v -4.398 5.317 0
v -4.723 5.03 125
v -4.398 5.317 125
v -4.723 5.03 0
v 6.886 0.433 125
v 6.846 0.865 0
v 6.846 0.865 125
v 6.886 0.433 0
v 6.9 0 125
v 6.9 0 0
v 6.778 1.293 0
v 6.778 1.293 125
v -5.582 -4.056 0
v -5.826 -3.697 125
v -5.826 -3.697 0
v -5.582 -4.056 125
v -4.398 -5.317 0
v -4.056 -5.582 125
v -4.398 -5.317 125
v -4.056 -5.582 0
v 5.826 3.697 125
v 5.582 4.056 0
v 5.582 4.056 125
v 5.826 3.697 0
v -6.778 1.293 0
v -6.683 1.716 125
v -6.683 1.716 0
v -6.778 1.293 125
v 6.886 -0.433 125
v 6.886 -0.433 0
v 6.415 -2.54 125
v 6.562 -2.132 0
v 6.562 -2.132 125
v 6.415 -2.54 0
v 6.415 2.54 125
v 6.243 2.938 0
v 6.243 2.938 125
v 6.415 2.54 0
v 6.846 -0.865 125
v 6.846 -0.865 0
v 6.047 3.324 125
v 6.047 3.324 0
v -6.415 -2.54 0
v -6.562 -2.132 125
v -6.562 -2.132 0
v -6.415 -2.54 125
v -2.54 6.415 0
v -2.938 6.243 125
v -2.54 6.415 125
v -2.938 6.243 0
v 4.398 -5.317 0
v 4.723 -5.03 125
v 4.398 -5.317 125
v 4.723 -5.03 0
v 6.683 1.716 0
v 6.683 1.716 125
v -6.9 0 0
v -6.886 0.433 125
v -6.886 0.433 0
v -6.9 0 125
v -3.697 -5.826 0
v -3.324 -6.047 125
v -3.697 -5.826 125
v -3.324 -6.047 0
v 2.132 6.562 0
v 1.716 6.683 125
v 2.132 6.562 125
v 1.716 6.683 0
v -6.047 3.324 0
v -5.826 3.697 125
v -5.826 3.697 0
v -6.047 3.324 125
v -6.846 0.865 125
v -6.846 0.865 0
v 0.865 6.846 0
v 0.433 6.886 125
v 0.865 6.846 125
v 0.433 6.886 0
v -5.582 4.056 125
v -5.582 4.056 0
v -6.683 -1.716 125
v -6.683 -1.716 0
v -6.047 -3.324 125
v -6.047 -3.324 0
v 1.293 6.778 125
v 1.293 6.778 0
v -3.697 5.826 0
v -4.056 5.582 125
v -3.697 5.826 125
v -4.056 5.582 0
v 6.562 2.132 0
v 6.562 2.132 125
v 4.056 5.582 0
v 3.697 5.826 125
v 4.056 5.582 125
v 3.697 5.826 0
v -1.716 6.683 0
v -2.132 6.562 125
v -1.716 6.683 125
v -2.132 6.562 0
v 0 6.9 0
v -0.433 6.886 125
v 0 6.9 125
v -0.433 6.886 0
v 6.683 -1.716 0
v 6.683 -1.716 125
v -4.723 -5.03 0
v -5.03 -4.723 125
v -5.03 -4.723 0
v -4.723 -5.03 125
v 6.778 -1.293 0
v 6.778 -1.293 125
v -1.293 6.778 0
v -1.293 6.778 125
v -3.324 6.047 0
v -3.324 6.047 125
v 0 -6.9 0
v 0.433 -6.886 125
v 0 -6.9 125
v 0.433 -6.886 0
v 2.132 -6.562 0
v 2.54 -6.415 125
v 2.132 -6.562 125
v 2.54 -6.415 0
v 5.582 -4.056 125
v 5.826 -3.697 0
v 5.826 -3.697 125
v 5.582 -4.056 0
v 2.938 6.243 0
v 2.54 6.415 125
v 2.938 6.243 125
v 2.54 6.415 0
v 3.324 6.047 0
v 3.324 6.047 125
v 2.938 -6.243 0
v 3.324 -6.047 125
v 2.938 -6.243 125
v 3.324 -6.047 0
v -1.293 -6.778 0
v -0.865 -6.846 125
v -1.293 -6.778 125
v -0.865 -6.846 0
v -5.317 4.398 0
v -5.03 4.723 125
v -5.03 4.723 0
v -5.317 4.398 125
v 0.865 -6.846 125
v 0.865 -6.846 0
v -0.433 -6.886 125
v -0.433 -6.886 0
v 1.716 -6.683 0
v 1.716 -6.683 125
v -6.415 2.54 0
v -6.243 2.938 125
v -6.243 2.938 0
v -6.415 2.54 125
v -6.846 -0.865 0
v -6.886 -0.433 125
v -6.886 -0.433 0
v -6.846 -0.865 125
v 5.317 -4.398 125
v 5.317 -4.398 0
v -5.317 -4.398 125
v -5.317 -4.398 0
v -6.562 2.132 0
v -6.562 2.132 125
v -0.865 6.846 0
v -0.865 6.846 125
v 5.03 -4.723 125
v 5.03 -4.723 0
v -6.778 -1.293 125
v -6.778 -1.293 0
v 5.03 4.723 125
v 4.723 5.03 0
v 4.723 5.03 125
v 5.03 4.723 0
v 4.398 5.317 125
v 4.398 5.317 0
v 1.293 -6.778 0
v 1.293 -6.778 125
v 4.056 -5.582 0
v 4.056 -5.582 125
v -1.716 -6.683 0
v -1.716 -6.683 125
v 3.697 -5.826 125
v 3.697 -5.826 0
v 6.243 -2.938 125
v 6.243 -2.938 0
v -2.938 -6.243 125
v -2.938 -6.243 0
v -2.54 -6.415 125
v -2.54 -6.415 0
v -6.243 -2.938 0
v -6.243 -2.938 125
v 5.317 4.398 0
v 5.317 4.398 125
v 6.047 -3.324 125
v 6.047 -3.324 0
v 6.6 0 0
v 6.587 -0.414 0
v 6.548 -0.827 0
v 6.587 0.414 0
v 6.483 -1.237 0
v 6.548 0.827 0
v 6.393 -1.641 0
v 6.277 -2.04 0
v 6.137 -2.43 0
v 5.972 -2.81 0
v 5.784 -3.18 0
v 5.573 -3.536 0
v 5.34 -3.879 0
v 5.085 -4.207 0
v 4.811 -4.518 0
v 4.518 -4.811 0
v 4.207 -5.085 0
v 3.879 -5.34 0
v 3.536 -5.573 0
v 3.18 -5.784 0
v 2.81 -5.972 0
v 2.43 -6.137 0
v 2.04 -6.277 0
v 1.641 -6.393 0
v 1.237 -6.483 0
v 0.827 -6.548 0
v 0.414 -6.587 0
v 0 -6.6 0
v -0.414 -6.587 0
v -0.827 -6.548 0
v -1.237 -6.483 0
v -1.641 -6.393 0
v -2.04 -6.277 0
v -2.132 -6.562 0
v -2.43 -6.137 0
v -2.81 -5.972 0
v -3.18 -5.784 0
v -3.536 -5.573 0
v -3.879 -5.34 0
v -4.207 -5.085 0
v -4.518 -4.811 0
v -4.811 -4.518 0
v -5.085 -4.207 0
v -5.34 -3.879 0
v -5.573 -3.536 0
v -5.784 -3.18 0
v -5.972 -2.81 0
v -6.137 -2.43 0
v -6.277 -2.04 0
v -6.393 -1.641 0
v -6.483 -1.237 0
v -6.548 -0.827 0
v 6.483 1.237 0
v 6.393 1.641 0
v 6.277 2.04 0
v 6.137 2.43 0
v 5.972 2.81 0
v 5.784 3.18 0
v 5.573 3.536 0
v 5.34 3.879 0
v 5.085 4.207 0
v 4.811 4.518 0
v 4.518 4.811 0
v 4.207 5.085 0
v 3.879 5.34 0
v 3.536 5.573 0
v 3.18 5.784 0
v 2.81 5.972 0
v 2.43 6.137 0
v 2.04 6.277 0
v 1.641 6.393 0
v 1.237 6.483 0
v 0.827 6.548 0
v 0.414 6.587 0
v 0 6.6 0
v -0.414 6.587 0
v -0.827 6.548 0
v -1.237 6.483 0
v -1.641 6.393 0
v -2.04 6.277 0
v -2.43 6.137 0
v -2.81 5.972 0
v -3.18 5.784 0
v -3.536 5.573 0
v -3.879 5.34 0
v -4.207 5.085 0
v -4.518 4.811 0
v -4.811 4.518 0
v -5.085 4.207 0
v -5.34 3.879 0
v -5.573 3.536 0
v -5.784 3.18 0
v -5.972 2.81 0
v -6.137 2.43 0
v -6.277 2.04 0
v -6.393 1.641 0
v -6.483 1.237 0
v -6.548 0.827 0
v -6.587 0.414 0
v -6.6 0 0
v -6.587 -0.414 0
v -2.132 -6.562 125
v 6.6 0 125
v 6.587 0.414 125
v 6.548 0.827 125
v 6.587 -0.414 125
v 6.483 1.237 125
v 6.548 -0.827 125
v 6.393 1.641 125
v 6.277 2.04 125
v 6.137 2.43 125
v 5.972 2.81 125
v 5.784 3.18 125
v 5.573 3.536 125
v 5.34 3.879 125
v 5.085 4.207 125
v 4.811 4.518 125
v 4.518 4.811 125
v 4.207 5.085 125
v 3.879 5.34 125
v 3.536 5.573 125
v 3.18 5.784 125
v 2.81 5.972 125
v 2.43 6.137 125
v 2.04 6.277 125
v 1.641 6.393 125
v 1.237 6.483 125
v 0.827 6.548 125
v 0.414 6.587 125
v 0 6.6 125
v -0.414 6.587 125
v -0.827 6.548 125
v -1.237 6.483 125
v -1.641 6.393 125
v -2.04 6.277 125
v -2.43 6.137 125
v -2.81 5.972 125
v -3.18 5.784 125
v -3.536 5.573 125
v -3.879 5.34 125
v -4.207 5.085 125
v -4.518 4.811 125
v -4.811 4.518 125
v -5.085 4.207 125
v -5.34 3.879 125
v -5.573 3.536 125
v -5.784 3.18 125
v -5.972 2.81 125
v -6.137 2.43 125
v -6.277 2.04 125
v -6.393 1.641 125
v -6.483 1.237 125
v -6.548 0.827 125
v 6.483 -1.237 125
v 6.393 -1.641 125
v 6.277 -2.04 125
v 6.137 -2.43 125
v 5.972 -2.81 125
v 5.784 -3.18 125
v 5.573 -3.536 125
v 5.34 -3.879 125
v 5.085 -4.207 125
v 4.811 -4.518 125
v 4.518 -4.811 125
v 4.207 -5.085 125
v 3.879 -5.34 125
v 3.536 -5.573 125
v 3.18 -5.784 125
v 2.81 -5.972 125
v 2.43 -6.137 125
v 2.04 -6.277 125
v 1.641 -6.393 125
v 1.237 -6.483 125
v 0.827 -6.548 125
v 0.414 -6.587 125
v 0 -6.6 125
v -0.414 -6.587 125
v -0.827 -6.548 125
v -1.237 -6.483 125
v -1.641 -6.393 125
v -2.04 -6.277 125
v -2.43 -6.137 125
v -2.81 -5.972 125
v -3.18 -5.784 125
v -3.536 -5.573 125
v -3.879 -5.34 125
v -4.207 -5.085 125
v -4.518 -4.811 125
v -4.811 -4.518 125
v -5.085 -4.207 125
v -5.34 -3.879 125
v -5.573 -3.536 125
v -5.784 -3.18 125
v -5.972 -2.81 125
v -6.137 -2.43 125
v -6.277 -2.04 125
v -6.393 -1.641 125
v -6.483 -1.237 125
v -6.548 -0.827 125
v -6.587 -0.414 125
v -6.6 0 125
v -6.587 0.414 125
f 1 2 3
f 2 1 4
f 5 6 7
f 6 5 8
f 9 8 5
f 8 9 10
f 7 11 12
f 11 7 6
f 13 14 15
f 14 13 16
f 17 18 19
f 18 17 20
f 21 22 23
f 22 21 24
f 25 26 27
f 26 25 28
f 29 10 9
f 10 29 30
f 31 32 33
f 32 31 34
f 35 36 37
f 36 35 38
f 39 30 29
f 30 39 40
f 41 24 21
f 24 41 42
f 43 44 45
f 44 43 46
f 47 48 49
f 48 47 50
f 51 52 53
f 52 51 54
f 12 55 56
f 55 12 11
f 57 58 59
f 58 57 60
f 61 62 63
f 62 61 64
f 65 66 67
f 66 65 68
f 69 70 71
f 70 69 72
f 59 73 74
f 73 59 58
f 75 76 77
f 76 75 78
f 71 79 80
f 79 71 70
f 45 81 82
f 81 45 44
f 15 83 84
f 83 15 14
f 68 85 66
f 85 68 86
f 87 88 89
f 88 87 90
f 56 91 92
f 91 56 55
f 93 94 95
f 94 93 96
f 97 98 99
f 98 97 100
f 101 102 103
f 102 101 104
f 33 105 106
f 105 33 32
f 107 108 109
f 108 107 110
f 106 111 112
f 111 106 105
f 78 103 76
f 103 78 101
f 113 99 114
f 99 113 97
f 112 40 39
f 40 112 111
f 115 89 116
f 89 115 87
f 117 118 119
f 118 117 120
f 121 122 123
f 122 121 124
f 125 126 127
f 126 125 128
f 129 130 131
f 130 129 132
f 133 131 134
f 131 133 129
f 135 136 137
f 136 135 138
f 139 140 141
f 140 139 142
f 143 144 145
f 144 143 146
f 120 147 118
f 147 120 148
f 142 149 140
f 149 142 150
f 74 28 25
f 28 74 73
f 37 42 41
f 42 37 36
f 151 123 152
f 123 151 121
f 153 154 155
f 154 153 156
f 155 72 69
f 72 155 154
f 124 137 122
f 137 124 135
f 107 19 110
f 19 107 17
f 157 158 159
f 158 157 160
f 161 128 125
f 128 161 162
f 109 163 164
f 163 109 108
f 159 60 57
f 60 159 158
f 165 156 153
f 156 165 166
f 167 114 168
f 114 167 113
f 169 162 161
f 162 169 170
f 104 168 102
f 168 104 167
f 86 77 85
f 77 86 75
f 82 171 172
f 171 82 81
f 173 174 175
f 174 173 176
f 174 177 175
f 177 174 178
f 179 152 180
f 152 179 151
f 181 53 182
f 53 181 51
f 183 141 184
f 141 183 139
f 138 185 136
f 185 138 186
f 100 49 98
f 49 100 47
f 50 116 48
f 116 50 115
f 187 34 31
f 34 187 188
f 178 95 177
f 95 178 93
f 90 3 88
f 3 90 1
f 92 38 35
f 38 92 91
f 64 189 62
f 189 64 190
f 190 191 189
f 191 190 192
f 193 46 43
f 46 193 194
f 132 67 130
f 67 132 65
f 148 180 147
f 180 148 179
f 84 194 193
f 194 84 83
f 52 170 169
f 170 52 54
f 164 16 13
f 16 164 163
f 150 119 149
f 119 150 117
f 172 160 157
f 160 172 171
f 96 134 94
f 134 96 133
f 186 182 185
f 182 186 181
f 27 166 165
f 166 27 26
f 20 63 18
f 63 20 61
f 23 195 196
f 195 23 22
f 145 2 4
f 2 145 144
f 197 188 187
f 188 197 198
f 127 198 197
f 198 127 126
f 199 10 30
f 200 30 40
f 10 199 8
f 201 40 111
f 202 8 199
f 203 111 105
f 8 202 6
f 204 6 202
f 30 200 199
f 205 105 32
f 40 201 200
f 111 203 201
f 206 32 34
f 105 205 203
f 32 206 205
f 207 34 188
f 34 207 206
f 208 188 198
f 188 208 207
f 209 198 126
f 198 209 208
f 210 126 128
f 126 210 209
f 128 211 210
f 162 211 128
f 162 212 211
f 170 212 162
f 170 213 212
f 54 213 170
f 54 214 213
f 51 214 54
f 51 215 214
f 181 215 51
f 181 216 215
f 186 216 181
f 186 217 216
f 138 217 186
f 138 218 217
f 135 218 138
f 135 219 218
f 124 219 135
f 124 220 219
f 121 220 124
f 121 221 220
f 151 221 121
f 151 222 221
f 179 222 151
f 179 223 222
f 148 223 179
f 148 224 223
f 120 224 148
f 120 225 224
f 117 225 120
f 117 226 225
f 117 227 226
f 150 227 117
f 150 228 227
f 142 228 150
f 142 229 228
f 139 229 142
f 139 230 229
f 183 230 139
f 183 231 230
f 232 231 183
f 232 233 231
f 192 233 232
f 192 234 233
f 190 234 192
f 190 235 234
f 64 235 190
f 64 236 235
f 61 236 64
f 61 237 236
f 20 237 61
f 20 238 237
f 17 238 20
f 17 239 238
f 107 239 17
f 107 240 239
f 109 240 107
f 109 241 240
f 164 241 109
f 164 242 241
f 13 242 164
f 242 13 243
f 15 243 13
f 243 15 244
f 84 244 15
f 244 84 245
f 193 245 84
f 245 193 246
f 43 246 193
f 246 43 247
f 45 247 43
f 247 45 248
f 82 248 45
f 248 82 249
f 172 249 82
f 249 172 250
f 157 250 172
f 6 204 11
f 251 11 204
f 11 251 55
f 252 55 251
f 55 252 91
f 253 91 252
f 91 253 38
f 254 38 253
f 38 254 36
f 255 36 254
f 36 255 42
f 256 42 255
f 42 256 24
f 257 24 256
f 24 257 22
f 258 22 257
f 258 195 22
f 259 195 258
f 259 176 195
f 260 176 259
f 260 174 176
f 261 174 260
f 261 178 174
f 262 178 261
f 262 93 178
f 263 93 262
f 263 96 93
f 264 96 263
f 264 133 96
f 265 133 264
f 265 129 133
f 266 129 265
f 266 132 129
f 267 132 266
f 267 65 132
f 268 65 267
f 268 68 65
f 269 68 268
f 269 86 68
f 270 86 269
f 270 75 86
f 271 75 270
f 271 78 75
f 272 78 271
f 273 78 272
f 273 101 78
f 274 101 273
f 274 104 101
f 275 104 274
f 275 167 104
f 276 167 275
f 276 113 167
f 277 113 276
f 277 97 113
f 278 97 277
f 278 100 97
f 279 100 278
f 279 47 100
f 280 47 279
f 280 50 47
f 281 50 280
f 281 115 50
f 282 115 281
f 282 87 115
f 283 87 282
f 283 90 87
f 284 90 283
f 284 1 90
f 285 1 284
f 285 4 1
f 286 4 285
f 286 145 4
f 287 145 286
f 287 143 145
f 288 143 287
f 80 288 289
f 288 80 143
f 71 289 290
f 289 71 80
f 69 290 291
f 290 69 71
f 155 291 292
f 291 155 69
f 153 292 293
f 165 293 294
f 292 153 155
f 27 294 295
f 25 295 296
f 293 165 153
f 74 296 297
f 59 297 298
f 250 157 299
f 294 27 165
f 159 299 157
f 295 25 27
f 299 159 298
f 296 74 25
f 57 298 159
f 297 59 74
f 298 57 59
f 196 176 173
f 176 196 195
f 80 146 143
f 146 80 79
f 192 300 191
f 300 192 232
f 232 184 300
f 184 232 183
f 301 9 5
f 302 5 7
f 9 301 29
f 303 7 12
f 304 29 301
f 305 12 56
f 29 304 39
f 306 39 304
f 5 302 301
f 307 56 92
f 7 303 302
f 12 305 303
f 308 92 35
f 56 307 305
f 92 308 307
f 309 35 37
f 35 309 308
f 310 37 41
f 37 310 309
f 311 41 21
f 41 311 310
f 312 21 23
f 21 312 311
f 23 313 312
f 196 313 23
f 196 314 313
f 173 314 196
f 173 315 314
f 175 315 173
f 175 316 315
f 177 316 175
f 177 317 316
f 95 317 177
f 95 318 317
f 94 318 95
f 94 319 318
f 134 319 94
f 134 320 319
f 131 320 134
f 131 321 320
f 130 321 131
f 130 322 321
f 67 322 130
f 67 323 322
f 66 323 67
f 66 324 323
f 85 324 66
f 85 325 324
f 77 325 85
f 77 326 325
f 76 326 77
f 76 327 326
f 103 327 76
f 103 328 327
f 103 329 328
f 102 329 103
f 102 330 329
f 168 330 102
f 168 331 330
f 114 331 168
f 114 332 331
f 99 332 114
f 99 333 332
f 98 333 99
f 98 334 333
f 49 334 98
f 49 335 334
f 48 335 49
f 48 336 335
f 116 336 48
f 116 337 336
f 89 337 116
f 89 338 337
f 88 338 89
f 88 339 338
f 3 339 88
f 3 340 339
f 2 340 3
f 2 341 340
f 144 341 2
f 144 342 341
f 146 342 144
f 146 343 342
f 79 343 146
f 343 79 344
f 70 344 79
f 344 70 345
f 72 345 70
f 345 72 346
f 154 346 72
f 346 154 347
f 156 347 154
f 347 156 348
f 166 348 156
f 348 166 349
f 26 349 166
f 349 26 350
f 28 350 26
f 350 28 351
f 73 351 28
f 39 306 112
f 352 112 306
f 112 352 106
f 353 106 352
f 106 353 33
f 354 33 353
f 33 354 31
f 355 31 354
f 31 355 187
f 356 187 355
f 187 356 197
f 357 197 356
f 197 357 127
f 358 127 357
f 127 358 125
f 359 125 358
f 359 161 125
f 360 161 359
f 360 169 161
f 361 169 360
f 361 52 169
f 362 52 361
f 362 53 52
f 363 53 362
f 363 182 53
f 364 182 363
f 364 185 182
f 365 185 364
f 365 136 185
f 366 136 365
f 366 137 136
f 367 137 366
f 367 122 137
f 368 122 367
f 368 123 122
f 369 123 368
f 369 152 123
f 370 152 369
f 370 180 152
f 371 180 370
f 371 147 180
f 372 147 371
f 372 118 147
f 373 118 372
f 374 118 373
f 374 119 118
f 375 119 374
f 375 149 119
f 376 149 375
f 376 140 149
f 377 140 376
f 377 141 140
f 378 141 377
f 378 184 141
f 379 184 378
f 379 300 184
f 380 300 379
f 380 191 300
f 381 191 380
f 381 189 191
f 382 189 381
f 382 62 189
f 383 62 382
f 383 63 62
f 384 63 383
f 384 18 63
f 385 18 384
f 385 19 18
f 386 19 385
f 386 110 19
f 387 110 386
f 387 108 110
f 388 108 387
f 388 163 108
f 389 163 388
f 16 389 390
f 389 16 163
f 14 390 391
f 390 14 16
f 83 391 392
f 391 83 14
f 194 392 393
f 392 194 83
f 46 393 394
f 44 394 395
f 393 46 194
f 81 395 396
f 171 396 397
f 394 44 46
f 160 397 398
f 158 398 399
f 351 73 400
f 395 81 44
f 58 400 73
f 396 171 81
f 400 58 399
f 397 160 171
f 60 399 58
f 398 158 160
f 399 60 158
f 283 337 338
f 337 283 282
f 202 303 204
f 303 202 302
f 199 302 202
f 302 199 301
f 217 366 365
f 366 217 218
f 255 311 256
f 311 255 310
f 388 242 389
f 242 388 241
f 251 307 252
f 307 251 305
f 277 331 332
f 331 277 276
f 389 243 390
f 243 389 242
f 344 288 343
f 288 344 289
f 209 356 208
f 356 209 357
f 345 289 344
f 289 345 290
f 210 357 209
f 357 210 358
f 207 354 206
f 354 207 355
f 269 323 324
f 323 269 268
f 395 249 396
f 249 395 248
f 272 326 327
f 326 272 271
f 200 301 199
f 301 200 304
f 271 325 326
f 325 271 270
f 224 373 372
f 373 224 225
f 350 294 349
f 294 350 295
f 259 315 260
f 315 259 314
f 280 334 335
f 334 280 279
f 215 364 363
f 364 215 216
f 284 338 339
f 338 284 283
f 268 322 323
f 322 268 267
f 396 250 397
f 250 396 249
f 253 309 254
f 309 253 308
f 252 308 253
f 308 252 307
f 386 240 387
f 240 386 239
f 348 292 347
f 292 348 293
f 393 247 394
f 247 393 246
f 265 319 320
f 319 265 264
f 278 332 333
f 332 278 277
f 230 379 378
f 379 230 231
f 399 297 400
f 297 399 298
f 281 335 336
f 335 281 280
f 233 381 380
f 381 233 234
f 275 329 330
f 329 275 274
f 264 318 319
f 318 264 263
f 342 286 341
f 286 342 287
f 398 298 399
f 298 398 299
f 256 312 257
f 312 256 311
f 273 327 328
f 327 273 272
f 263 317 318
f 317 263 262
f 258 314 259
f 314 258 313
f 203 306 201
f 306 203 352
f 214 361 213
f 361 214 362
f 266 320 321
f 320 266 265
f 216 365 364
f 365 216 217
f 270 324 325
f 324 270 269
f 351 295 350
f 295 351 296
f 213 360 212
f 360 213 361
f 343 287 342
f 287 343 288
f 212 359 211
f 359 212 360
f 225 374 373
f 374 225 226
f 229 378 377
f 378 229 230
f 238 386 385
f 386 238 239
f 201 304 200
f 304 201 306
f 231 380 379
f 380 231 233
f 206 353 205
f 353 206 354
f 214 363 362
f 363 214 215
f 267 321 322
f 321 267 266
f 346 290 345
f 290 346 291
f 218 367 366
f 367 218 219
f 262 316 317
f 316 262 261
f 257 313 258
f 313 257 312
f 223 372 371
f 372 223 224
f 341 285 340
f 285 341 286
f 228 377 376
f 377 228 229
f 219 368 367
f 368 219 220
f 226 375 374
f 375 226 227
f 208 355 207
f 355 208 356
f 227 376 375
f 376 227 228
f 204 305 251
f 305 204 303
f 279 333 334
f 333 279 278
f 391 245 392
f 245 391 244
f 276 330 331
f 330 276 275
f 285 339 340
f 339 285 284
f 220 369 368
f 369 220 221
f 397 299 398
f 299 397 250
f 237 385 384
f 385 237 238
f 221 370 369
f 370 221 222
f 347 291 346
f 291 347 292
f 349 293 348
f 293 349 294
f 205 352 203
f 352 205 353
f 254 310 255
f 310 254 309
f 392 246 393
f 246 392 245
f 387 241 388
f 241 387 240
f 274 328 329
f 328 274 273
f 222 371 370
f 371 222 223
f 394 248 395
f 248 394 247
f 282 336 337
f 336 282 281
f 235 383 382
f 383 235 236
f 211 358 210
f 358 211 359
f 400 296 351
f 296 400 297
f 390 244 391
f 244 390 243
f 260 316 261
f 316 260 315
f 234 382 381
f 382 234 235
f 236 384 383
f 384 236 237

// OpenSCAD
tube_size = 13.8; //[13.8:BT-5, 18.7:BT-20, 24.8:BT-50, 33.7:BT-55, 34.2:BT-56, 41.6:BT-60, 56.3:BT-70, 66.04:BT-80, 100:BT-101]

//How long do you want the tube to be (mm)?
length = 125;

if (tube_size==13.8) {
difference(){
cylinder(h=length, r=13.8/2, center=false, $fn=100);
    cylinder (h=length, r=13.2/2, center=false, $fn=100);
}
}

if (tube_size==18.7) {
difference(){
cylinder(h=length, r=18.7/2, center=false, $fn=100);
    cylinder (h=length, r=18/2, center=false, $fn=100);
}
}

if (tube_size==24.8) {
difference(){
cylinder(h=length, r=24.8/2, center=false, $fn=100);
    cylinder (h=length, r=24.1/2, center=false, $fn=100);
}
}

if (tube_size==33.7) {
difference(){
cylinder(h=length, r=33.7/2, center=false, $fn=100);
    cylinder (h=length, r=32.6/2, center=false, $fn=100);
}
}

if (tube_size==34.2) {
difference(){
cylinder(h=length, r=34.2/2, center=false, $fn=100);
    cylinder (h=length, r=33.1/2, center=false, $fn=100);
}
}

if (tube_size==41.6) {
difference(){
cylinder(h=length, r=41.6/2, center=false, $fn=100);
    cylinder (h=length, r=40.5/2, center=false, $fn=100);
}
}

if (tube_size==56.3) {
difference(){
cylinder(h=length, r=56.3/2, center=false, $fn=100);
    cylinder (h=length, r=55.4/2, center=false, $fn=100);
}
}

if (tube_size==66.04) {
difference(){
cylinder(h=length, r=66.04/2, center=false, $fn=100);
    cylinder (h=length, r=65.7/2, center=false, $fn=100);
}
}

if (tube_size==100) {
difference(){
cylinder(h=length, r=100/2, center=false, $fn=100);
    cylinder (h=length, r=99/2, center=false, $fn=100);
}
}
